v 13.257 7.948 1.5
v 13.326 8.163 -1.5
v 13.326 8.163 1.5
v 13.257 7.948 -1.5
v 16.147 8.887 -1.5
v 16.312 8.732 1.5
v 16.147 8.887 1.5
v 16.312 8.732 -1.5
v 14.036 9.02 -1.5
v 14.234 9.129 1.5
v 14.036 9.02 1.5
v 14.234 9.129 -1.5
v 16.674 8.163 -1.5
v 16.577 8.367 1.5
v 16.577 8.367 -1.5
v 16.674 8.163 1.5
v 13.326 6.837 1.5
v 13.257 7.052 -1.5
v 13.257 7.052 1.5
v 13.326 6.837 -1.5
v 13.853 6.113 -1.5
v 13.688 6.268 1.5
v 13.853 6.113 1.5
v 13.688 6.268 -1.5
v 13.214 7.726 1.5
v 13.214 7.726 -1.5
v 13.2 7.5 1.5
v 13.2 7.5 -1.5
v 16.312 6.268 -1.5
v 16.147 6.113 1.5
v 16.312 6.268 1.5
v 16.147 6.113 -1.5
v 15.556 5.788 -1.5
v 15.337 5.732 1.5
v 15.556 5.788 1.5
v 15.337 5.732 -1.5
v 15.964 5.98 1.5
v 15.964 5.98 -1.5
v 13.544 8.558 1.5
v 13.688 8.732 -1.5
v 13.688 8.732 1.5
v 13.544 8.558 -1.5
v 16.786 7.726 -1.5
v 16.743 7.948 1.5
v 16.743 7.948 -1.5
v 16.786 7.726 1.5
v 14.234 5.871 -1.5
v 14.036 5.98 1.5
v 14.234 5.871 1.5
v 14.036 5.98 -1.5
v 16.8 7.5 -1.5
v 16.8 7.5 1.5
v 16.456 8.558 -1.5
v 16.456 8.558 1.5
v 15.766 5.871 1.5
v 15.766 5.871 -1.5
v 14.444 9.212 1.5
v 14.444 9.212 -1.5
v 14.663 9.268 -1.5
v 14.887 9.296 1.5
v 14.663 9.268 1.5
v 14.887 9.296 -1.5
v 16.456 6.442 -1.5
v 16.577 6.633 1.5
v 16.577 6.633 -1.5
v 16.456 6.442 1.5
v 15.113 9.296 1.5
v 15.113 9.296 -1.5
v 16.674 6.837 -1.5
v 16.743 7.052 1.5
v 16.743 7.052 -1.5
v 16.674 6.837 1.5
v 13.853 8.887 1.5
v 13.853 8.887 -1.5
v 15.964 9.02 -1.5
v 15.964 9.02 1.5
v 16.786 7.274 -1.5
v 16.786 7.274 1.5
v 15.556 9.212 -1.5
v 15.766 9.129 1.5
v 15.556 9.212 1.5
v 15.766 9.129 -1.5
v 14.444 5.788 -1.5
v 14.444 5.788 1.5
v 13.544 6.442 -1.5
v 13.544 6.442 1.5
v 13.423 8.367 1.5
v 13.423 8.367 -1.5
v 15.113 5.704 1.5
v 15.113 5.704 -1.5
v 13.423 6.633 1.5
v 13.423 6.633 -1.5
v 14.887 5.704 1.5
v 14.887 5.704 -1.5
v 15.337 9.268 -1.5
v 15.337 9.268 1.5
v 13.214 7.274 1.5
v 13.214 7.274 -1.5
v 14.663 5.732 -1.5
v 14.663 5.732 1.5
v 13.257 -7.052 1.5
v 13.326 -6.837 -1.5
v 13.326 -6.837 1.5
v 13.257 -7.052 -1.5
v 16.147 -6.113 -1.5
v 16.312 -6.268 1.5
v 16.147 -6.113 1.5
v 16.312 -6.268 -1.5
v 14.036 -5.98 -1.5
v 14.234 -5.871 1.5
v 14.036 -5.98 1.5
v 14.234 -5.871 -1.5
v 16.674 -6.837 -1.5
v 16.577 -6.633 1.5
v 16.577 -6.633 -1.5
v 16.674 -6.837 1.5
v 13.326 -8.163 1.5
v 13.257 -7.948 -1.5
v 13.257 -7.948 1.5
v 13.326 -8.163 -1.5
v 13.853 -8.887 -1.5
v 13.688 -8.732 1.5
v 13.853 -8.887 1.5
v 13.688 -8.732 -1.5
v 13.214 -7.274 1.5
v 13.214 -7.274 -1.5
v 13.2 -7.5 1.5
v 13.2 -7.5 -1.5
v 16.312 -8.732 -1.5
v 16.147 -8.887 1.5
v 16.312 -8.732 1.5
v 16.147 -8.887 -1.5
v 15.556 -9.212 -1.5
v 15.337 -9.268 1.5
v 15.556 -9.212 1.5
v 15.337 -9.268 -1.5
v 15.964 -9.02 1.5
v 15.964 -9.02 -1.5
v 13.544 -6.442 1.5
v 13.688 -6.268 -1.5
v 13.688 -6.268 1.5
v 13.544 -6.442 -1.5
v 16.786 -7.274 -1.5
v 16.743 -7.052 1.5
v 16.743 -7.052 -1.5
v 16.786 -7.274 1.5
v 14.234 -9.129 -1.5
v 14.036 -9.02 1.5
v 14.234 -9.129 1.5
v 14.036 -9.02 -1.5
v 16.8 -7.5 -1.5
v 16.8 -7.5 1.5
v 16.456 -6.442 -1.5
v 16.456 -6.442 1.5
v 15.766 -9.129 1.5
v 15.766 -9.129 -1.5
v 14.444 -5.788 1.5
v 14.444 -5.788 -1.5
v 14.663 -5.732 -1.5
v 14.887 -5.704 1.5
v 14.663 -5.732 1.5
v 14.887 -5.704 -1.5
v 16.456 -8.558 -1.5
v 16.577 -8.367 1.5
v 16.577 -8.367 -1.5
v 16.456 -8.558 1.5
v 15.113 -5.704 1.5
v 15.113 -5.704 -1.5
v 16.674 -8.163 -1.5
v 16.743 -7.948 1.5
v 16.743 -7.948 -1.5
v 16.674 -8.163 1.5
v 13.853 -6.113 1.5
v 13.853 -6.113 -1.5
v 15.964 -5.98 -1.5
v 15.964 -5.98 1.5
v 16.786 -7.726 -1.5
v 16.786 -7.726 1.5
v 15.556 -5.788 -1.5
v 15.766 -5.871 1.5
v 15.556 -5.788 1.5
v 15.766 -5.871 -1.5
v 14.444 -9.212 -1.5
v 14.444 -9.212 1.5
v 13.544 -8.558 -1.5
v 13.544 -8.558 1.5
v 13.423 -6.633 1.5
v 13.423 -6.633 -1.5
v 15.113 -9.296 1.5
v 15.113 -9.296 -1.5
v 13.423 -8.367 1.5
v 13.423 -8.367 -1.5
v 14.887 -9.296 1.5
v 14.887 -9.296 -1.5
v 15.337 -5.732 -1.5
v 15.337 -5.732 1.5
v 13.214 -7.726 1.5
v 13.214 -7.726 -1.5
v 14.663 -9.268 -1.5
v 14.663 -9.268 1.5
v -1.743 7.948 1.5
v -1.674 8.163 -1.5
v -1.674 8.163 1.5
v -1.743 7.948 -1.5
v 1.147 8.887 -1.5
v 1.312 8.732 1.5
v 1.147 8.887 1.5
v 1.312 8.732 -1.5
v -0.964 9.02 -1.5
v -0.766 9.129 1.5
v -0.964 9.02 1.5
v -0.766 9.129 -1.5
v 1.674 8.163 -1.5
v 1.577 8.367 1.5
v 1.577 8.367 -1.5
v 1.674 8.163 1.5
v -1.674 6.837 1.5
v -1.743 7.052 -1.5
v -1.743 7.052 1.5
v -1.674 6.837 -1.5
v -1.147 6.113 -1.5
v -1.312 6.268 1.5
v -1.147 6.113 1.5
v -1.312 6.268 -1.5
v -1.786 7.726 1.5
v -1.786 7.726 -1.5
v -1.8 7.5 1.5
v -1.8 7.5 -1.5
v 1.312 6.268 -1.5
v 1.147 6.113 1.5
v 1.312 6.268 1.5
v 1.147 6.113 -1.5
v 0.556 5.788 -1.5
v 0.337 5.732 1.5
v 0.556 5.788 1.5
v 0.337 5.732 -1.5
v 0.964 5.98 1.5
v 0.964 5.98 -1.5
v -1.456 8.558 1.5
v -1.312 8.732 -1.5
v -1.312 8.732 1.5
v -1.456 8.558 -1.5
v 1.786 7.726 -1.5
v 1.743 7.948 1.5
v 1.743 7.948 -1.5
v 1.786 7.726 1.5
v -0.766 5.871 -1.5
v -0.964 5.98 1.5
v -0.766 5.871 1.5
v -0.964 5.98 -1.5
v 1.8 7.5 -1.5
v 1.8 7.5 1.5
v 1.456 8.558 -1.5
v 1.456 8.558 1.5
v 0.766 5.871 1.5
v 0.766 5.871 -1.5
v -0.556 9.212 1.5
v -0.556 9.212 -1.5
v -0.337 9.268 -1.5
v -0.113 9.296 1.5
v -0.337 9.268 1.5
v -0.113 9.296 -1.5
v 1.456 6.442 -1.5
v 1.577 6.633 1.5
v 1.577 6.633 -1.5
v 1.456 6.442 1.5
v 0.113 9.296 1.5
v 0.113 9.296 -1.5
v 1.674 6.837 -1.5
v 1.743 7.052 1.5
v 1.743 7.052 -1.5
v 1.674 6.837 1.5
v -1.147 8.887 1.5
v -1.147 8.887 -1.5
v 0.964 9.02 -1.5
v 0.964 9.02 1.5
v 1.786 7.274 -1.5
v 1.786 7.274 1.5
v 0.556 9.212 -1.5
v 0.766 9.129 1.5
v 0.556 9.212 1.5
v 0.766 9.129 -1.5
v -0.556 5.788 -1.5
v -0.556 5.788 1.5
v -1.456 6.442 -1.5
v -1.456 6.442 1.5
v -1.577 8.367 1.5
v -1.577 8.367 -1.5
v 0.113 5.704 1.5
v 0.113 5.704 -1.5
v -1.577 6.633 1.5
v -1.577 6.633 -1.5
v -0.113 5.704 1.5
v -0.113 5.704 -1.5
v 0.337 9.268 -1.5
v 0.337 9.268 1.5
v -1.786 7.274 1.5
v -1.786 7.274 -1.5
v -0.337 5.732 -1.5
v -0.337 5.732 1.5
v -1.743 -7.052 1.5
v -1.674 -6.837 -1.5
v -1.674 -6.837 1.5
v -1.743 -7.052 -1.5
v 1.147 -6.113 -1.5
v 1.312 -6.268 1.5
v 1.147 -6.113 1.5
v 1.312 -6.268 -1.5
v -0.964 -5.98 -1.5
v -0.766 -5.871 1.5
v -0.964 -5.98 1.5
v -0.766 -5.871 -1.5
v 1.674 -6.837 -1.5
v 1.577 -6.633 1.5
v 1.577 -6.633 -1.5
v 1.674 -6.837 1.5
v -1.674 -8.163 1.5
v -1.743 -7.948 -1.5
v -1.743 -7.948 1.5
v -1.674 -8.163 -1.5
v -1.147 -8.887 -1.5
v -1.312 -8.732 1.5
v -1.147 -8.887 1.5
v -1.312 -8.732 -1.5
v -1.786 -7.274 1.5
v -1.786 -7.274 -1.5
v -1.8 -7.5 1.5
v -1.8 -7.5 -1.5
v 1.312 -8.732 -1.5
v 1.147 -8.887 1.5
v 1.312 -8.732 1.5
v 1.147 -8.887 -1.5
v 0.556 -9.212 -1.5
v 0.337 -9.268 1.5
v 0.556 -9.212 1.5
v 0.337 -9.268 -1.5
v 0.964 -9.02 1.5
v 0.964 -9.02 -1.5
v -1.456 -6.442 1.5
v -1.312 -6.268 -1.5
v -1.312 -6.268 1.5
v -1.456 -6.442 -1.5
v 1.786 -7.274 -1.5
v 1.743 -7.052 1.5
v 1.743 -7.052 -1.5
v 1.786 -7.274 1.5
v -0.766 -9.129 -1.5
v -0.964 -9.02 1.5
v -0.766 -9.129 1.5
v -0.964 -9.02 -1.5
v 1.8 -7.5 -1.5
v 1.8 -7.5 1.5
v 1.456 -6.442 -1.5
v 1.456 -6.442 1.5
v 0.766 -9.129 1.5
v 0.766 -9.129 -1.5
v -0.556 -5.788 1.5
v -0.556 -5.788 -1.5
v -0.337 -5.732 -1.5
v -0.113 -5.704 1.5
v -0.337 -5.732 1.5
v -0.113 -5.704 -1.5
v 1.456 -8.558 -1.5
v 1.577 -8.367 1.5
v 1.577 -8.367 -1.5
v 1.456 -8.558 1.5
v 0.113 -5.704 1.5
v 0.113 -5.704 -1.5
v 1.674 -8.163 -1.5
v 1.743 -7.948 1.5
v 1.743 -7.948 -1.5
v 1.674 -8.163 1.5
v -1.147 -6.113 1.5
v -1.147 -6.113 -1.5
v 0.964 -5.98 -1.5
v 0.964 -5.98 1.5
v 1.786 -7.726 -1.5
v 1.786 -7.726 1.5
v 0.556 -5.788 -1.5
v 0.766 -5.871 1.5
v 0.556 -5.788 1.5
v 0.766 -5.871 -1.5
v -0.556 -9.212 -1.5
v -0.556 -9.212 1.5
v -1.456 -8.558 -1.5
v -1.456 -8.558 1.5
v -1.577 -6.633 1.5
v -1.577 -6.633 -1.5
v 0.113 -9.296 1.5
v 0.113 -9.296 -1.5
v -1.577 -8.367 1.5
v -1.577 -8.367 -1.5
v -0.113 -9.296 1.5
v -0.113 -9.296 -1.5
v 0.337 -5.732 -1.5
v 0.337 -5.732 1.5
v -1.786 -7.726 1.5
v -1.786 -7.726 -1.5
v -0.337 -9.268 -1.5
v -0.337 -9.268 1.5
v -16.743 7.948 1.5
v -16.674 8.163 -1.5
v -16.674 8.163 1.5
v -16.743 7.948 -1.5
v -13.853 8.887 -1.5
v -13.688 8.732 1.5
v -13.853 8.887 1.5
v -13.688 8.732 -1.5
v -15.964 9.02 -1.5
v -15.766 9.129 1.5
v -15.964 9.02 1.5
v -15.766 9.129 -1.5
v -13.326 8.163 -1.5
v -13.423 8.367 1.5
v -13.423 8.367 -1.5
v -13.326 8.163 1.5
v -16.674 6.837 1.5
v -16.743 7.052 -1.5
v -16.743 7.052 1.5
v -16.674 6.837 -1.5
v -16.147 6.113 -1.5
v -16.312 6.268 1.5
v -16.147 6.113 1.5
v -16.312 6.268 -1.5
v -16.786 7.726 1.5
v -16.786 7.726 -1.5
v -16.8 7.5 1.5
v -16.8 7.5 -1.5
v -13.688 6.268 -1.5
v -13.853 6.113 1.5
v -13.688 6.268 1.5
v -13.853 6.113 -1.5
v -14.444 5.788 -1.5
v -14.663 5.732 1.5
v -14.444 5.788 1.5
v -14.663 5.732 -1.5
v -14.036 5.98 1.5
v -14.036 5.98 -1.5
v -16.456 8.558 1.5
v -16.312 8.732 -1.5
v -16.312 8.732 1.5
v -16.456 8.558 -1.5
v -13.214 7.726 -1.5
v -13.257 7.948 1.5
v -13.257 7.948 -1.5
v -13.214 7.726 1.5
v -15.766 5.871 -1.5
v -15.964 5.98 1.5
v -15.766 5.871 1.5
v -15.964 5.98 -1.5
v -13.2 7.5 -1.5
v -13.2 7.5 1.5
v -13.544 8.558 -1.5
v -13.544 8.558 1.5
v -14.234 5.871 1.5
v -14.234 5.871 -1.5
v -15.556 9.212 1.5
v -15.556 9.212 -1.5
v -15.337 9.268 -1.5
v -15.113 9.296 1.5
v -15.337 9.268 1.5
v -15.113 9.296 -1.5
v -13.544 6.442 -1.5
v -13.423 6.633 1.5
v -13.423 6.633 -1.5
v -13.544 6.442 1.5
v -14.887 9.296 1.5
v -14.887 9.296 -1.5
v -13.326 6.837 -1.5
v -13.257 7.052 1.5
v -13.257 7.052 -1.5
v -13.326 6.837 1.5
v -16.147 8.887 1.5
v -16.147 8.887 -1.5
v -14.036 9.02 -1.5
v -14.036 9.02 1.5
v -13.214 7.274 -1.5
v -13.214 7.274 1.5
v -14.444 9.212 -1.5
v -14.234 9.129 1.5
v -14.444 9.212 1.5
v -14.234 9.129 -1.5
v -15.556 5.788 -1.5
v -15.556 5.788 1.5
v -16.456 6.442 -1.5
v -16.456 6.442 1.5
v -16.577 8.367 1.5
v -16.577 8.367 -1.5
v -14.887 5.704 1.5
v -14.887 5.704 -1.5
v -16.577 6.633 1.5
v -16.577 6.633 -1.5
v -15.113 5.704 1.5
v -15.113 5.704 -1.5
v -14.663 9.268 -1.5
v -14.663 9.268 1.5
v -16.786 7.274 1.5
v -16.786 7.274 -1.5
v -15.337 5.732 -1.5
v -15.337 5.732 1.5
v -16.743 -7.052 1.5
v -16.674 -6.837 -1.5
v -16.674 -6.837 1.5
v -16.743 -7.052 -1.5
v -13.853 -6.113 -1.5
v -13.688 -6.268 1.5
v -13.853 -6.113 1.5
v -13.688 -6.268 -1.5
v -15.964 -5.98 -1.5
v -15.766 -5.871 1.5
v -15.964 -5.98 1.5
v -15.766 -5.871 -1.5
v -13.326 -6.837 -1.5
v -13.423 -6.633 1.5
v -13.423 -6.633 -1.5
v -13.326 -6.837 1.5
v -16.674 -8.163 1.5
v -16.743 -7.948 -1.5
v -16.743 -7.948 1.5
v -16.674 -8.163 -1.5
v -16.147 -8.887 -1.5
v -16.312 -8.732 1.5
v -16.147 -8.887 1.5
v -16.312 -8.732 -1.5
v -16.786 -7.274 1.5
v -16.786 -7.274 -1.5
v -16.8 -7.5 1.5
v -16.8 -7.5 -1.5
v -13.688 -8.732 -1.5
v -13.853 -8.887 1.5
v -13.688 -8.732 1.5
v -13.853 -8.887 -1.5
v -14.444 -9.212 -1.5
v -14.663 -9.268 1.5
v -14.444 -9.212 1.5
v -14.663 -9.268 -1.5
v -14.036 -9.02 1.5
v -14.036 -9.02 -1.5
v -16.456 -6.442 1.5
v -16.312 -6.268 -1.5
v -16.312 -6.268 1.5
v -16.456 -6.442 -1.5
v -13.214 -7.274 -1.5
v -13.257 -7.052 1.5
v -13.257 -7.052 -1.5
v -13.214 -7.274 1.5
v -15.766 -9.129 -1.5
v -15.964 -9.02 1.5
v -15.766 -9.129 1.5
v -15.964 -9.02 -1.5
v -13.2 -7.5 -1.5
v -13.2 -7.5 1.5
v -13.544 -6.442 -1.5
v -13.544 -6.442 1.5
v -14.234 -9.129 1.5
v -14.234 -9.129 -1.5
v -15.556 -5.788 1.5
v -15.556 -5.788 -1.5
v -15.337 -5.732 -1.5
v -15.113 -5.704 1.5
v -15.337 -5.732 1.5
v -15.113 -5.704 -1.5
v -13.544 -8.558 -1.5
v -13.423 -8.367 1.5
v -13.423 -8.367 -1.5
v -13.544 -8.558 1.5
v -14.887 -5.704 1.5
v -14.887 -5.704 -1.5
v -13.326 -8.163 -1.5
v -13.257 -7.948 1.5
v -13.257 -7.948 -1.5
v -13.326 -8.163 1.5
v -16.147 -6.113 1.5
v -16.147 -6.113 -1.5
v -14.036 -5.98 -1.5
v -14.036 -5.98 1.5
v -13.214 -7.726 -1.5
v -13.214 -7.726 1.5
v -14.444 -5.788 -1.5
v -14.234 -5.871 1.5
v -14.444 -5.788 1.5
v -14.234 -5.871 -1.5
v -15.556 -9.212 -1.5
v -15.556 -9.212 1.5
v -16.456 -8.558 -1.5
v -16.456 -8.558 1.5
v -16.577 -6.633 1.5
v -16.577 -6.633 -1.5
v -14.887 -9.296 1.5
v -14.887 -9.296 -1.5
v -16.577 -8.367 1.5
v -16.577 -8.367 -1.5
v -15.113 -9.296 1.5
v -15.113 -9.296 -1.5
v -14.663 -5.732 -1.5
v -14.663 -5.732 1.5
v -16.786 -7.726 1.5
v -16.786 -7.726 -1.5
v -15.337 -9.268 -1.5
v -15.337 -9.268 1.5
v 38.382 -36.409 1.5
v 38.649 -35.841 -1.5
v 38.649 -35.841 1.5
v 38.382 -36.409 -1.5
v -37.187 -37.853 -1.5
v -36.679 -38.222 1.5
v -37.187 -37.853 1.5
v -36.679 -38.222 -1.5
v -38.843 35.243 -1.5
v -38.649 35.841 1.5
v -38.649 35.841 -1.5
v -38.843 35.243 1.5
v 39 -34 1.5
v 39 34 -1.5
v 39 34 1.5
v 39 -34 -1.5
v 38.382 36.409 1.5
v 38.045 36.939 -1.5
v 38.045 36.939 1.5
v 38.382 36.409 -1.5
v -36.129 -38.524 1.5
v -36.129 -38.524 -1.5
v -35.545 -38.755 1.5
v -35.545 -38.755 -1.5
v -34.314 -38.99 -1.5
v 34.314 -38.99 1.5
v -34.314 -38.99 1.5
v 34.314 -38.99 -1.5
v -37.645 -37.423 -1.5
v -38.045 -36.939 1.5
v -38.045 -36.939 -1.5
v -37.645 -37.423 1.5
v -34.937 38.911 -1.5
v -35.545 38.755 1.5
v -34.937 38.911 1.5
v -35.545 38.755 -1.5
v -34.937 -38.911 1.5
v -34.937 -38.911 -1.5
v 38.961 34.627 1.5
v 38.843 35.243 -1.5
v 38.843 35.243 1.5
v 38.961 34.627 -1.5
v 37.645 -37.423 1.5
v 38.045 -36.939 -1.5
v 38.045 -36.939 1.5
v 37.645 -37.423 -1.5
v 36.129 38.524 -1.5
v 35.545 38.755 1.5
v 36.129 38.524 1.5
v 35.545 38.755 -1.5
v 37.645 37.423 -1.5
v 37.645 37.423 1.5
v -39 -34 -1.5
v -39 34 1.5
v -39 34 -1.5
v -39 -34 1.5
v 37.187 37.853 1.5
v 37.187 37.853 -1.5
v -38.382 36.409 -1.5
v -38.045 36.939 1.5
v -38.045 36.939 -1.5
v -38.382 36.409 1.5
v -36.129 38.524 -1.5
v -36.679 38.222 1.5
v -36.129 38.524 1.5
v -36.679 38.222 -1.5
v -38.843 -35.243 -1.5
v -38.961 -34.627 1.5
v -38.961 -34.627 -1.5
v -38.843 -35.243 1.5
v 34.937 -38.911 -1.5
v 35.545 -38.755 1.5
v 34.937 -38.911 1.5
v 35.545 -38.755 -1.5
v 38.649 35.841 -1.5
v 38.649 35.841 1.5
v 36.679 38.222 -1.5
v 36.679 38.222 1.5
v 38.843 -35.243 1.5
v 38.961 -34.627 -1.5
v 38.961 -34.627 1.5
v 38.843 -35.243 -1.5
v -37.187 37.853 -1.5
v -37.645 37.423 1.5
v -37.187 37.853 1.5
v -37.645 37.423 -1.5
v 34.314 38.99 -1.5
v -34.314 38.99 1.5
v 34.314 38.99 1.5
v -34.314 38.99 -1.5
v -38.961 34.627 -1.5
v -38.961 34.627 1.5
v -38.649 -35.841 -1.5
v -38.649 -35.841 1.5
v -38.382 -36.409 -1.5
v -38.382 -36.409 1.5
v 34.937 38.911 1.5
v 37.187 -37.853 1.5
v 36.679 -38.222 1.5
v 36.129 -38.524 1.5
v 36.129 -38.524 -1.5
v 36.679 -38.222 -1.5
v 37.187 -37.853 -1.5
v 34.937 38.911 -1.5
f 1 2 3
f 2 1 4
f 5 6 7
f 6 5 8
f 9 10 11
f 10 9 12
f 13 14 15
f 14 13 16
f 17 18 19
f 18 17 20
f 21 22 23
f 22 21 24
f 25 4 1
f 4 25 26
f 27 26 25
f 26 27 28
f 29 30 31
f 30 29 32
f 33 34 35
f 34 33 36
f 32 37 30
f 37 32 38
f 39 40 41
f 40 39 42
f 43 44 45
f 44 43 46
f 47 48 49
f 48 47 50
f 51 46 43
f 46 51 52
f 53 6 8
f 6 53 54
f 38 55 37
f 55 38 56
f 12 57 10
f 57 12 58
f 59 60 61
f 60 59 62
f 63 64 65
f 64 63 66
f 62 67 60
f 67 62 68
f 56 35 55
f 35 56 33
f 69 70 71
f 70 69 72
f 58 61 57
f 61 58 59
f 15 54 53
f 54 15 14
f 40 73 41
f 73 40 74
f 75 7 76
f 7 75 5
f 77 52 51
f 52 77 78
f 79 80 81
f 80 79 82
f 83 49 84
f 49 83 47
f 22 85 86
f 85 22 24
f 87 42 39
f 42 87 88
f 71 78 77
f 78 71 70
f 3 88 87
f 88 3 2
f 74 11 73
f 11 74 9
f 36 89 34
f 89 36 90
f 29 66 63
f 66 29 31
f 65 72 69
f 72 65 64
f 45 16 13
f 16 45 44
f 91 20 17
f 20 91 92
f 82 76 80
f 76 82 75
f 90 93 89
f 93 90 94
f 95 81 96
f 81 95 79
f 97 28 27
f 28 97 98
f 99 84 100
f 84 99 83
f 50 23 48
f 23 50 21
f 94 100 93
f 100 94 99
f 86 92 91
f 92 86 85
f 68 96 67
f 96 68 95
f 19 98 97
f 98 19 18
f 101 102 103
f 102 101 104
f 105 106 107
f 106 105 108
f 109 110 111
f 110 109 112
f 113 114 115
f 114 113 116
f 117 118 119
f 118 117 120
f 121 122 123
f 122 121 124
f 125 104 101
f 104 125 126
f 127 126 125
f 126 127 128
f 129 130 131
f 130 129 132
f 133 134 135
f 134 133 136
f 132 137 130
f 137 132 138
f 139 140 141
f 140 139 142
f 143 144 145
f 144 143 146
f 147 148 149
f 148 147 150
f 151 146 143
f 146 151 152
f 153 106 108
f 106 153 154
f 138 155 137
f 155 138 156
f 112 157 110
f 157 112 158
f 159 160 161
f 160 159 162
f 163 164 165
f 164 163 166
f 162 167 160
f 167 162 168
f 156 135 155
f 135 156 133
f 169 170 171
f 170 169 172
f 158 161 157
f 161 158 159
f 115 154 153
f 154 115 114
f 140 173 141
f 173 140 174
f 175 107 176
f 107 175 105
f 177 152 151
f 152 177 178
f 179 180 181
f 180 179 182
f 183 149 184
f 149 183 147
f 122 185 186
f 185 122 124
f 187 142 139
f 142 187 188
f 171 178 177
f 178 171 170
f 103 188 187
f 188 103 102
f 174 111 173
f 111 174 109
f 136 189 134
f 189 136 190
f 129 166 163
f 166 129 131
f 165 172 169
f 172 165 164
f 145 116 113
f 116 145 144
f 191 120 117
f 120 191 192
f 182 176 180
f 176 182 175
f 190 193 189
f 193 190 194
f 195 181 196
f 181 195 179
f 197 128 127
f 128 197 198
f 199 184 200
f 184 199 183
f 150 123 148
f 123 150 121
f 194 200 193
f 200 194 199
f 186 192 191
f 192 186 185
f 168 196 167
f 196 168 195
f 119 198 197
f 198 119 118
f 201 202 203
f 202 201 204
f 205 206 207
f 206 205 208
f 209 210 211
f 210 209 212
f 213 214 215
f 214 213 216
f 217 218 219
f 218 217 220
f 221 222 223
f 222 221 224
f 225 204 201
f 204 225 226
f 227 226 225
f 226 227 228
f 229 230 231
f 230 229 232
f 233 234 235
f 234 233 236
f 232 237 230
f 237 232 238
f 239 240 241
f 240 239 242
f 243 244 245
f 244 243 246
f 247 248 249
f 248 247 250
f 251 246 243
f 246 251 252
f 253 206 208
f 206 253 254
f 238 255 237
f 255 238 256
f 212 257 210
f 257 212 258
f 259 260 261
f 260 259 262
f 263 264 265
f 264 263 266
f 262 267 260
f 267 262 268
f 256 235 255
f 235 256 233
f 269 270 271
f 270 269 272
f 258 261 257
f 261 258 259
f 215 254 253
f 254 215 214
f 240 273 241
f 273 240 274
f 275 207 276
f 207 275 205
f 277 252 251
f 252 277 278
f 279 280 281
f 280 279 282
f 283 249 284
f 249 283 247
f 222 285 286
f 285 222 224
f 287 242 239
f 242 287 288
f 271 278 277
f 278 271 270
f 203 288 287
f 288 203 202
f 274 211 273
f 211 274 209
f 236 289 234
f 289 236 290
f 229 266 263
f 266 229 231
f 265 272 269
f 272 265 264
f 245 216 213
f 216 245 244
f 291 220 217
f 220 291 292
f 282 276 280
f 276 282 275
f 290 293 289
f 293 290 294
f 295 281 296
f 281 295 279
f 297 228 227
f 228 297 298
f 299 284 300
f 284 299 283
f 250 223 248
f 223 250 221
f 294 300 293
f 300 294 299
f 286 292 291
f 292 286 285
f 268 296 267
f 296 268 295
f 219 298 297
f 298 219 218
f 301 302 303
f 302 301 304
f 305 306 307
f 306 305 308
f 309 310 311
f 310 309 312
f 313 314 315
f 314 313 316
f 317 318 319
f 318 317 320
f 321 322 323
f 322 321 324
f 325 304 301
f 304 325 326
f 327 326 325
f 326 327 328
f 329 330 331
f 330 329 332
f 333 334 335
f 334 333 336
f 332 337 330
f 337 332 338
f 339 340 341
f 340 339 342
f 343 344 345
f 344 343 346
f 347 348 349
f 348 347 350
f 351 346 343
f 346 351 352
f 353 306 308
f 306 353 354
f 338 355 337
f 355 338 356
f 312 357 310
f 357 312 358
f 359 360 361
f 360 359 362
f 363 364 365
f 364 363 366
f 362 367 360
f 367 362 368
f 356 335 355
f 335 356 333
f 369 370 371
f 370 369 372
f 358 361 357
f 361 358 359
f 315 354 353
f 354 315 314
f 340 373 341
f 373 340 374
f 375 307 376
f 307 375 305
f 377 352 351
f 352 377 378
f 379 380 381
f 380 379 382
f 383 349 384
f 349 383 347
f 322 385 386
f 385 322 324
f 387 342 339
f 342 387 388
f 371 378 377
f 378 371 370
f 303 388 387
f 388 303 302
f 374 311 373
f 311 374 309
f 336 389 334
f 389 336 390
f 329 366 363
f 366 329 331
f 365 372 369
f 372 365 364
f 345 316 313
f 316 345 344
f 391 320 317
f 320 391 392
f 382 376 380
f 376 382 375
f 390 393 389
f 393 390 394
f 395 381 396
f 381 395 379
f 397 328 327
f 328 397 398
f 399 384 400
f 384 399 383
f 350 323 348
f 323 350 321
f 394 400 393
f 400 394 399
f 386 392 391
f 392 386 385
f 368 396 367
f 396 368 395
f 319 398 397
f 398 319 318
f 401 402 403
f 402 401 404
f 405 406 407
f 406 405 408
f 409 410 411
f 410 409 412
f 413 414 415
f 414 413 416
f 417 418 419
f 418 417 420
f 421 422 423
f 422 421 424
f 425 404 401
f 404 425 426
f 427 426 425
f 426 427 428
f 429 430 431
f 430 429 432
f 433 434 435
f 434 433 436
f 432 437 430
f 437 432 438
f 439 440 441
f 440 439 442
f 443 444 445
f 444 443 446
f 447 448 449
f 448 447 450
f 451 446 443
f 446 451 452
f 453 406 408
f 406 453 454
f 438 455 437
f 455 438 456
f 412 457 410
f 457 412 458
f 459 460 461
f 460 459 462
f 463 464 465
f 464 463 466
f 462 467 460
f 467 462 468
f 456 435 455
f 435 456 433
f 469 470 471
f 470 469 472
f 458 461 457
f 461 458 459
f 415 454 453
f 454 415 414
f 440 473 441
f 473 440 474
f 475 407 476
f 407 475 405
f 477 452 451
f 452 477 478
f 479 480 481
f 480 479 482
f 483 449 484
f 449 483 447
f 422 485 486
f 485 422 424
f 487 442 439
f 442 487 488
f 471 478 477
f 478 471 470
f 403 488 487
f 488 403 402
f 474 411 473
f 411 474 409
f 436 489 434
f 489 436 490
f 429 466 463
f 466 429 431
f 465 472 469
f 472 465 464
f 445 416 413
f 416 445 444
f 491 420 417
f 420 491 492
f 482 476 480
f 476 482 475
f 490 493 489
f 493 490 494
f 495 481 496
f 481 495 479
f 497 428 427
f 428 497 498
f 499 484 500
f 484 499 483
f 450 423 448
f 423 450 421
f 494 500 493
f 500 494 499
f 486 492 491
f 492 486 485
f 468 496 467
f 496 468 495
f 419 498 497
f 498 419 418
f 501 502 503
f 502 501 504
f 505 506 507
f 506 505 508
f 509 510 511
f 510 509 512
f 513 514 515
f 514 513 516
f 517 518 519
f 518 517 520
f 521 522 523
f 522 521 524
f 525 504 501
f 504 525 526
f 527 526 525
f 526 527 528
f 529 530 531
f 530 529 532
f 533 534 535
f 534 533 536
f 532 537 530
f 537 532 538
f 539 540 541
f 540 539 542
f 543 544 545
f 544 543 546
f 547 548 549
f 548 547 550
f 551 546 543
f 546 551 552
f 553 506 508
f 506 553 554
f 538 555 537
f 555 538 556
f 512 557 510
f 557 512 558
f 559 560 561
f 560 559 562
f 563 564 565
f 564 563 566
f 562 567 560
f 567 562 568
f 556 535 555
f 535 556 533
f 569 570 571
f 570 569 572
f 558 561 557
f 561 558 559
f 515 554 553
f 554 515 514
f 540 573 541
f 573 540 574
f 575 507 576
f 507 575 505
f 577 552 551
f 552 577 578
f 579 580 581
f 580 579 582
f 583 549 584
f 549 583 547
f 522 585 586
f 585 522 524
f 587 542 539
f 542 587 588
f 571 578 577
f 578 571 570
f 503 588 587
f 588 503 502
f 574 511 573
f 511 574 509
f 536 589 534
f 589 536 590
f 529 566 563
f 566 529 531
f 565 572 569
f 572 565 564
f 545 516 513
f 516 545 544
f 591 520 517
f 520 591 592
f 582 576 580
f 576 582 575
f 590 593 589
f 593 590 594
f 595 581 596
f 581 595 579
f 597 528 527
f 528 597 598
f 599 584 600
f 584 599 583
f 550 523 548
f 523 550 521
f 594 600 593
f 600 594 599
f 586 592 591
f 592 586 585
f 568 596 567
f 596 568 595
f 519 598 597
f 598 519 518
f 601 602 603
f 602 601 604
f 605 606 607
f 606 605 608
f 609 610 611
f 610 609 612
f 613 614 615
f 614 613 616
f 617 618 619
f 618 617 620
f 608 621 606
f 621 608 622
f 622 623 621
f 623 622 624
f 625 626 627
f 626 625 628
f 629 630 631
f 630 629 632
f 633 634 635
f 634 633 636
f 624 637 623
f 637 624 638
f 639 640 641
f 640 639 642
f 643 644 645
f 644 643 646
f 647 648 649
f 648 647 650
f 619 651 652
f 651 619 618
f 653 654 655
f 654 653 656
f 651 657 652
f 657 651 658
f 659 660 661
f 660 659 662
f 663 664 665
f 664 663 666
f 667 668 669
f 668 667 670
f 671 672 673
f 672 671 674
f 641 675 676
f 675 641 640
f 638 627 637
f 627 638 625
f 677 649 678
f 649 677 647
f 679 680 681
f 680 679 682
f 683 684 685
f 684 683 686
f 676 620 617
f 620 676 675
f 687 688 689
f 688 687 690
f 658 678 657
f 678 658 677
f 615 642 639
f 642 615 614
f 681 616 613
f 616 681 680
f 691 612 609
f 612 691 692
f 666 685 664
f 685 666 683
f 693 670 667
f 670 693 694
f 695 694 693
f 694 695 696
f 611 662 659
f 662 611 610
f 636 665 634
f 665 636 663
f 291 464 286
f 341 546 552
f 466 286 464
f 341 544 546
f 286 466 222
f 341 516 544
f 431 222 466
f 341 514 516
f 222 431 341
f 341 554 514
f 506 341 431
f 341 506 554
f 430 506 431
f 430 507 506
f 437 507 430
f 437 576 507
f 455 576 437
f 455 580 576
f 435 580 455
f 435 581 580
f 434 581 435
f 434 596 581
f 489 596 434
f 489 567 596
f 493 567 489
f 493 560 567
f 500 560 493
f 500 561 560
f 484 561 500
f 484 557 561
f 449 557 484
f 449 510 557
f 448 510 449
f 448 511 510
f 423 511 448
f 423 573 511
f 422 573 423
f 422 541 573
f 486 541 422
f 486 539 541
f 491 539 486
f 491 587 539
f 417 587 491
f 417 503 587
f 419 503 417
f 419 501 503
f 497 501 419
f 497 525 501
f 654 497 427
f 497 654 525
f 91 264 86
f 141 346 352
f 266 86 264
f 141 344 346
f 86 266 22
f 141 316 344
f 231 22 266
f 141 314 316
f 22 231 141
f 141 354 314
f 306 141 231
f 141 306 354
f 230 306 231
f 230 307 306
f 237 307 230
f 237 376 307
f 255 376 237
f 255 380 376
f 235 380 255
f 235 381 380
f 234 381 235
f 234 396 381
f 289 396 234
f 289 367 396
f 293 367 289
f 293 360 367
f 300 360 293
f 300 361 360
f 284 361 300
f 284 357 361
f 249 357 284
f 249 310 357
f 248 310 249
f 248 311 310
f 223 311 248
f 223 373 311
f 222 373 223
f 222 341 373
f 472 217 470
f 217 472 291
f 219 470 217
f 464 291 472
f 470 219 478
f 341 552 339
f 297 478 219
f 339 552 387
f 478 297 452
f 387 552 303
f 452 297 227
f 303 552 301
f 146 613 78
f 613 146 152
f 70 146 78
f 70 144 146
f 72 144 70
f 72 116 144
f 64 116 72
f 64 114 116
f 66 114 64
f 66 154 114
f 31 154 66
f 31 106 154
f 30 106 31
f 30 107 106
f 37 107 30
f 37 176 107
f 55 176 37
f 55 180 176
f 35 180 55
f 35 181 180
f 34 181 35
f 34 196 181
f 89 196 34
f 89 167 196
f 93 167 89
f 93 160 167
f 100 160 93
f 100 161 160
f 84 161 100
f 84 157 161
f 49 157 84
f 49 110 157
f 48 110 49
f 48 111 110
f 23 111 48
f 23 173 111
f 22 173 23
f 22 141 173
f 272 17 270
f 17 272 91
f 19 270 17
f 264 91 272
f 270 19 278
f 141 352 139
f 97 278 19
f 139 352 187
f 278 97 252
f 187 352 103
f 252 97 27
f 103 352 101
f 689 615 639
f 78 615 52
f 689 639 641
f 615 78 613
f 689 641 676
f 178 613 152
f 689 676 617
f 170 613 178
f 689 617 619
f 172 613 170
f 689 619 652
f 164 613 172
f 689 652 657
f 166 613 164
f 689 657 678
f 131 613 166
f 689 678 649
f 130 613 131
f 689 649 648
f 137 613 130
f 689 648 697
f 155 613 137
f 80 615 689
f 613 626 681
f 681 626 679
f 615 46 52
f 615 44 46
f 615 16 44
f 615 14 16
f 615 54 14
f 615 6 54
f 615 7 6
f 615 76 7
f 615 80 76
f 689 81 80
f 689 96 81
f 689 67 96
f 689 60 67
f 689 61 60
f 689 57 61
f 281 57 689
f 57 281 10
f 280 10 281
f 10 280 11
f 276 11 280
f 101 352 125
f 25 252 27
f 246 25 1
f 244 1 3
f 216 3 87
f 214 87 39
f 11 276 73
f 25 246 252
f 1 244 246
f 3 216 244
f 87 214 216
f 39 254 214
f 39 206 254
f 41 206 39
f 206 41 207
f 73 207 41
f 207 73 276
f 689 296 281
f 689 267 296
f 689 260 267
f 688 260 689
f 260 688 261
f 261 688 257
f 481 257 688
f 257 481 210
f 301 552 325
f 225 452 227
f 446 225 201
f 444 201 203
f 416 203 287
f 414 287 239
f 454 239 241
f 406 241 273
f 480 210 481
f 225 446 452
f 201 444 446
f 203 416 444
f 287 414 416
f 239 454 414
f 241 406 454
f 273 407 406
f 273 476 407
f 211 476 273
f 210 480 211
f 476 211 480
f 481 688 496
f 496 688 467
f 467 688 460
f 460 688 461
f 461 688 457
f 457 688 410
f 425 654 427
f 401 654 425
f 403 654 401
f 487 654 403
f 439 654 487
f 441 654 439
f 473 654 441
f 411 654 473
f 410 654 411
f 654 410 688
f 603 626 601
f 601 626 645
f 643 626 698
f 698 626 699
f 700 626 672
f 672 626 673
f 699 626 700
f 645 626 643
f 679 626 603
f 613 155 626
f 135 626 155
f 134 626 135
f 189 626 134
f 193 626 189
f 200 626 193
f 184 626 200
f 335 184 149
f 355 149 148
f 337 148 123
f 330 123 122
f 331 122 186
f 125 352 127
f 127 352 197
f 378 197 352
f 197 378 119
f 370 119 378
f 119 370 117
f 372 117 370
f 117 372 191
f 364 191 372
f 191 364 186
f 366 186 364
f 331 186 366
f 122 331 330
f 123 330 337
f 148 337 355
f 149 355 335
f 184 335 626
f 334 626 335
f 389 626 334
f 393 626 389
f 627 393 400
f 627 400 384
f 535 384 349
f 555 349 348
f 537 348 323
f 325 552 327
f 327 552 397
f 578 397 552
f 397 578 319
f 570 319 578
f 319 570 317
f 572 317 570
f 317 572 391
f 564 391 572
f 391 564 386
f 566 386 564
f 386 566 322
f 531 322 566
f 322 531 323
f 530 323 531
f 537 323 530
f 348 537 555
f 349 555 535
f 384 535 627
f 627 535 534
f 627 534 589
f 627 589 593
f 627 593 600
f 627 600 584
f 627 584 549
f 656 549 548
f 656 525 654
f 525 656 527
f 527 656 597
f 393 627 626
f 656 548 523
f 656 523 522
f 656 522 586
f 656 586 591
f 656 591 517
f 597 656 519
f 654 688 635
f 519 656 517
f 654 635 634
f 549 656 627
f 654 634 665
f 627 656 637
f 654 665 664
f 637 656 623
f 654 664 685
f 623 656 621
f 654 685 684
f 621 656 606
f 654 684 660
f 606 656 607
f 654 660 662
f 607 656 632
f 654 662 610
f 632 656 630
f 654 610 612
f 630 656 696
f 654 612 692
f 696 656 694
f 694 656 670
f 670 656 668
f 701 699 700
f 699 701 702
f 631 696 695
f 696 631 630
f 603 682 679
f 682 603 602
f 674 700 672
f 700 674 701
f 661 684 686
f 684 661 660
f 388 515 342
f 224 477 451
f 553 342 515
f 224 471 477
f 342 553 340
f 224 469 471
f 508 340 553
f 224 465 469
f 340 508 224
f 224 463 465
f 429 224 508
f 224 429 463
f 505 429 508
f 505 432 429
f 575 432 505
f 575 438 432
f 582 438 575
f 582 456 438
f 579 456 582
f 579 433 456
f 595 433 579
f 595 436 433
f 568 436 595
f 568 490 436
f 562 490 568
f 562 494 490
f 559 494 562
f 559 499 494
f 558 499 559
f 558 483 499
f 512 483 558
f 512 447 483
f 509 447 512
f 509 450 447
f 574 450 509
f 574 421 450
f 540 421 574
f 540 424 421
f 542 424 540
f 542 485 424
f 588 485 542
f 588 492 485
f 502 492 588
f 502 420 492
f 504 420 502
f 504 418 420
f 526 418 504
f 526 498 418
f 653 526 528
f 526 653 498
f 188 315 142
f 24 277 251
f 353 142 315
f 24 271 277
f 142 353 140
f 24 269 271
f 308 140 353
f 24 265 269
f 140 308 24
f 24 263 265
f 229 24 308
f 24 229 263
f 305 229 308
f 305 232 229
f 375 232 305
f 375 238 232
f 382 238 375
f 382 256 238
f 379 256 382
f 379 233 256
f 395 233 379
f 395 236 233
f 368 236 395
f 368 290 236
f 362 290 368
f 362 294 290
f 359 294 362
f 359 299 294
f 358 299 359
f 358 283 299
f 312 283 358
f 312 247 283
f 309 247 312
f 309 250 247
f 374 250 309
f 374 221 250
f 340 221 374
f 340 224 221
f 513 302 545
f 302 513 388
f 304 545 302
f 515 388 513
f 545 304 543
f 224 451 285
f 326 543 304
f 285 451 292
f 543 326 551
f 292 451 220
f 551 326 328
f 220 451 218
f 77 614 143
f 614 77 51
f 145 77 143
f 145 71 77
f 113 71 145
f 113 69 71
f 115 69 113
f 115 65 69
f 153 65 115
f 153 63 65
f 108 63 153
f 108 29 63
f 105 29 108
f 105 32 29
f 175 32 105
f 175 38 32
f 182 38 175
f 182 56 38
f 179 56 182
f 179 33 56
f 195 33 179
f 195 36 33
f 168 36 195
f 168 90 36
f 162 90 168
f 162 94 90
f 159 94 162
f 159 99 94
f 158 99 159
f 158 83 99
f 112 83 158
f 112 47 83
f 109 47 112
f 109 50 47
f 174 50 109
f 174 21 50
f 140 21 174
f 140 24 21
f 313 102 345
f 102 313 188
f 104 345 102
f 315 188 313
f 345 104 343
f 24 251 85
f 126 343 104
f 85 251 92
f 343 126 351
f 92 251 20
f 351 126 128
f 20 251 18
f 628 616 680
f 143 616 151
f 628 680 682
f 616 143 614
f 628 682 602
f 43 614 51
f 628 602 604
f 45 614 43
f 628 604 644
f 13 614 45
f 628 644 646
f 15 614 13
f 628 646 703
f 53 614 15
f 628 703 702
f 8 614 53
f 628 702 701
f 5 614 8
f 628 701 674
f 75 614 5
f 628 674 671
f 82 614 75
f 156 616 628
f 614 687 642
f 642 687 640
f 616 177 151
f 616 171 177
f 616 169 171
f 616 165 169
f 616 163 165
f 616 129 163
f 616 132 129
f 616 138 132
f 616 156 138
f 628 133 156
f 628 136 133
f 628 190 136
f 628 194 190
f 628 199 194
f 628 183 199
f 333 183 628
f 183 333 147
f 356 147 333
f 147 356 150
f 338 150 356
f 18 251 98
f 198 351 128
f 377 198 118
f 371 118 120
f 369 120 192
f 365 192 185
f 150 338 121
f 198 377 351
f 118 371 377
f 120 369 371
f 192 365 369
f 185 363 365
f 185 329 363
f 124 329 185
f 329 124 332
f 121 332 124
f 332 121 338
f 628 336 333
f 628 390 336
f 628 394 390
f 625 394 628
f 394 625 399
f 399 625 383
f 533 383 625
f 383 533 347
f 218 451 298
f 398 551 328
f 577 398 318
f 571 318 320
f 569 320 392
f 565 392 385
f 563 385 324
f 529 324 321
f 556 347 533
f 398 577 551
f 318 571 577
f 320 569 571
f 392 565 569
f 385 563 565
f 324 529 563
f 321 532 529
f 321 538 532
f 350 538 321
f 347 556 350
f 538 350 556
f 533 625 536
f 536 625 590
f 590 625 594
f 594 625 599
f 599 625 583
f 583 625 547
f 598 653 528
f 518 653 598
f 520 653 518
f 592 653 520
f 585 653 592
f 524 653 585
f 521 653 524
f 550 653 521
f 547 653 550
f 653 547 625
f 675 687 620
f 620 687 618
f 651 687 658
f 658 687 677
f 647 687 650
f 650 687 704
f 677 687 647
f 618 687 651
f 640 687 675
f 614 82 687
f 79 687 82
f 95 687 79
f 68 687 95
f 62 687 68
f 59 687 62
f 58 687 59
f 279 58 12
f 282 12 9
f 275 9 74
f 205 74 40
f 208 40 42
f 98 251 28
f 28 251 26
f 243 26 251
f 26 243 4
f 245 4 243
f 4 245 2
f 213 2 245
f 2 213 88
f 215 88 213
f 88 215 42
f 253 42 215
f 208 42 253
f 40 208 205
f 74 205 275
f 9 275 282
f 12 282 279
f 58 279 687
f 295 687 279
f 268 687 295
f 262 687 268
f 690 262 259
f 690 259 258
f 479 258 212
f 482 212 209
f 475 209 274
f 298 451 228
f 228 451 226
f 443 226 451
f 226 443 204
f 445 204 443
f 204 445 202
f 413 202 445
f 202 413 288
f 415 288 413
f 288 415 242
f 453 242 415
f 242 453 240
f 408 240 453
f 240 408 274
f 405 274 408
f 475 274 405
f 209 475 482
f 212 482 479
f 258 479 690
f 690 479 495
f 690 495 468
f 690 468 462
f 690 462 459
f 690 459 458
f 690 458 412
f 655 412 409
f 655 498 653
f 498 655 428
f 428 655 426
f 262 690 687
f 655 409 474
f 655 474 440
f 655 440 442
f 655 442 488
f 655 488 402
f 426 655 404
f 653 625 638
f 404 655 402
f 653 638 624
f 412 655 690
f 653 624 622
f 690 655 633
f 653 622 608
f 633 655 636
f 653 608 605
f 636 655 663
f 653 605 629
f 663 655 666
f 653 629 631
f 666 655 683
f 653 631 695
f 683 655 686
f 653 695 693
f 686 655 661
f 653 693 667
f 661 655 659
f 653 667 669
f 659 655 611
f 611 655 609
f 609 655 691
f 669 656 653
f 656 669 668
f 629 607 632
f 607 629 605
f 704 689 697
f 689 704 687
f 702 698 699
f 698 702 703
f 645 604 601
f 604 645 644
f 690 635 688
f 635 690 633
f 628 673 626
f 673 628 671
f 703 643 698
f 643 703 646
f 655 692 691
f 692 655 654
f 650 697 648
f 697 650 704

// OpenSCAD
$fn = 50;


difference() {
	union() {
		translate(v = [0, 0, -1.5000000000]) {
			hull() {
				translate(v = [-34.0000000000, 34.0000000000, 0]) {
					cylinder(h = 3, r = 5);
				}
				translate(v = [34.0000000000, 34.0000000000, 0]) {
					cylinder(h = 3, r = 5);
				}
				translate(v = [-34.0000000000, -34.0000000000, 0]) {
					cylinder(h = 3, r = 5);
				}
				translate(v = [34.0000000000, -34.0000000000, 0]) {
					cylinder(h = 3, r = 5);
				}
			}
		}
	}
	union() {
		translate(v = [15, 7.5000000000, 0]) {
			rotate(a = [0, 0, 0]) {
				difference() {
					union() {
						translate(v = [0, 0, -50.0000000000]) {
							cylinder(h = 100, r = 1.8000000000);
						}
					}
					union();
				}
			}
		}
		translate(v = [15, -7.5000000000, 0]) {
			rotate(a = [0, 0, 0]) {
				difference() {
					union() {
						translate(v = [0, 0, -50.0000000000]) {
							cylinder(h = 100, r = 1.8000000000);
						}
					}
					union();
				}
			}
		}
		translate(v = [0, 7.5000000000, 0]) {
			rotate(a = [0, 0, 0]) {
				difference() {
					union() {
						translate(v = [0, 0, -50.0000000000]) {
							cylinder(h = 100, r = 1.8000000000);
						}
					}
					union();
				}
			}
		}
		translate(v = [0, -7.5000000000, 0]) {
			rotate(a = [0, 0, 0]) {
				difference() {
					union() {
						translate(v = [0, 0, -50.0000000000]) {
							cylinder(h = 100, r = 1.8000000000);
						}
					}
					union();
				}
			}
		}
		translate(v = [-15, 7.5000000000, 0]) {
			rotate(a = [0, 0, 0]) {
				difference() {
					union() {
						translate(v = [0, 0, -50.0000000000]) {
							cylinder(h = 100, r = 1.8000000000);
						}
					}
					union();
				}
			}
		}
		translate(v = [-15, -7.5000000000, 0]) {
			rotate(a = [0, 0, 0]) {
				difference() {
					union() {
						translate(v = [0, 0, -50.0000000000]) {
							cylinder(h = 100, r = 1.8000000000);
						}
					}
					union();
				}
			}
		}
	}
}
